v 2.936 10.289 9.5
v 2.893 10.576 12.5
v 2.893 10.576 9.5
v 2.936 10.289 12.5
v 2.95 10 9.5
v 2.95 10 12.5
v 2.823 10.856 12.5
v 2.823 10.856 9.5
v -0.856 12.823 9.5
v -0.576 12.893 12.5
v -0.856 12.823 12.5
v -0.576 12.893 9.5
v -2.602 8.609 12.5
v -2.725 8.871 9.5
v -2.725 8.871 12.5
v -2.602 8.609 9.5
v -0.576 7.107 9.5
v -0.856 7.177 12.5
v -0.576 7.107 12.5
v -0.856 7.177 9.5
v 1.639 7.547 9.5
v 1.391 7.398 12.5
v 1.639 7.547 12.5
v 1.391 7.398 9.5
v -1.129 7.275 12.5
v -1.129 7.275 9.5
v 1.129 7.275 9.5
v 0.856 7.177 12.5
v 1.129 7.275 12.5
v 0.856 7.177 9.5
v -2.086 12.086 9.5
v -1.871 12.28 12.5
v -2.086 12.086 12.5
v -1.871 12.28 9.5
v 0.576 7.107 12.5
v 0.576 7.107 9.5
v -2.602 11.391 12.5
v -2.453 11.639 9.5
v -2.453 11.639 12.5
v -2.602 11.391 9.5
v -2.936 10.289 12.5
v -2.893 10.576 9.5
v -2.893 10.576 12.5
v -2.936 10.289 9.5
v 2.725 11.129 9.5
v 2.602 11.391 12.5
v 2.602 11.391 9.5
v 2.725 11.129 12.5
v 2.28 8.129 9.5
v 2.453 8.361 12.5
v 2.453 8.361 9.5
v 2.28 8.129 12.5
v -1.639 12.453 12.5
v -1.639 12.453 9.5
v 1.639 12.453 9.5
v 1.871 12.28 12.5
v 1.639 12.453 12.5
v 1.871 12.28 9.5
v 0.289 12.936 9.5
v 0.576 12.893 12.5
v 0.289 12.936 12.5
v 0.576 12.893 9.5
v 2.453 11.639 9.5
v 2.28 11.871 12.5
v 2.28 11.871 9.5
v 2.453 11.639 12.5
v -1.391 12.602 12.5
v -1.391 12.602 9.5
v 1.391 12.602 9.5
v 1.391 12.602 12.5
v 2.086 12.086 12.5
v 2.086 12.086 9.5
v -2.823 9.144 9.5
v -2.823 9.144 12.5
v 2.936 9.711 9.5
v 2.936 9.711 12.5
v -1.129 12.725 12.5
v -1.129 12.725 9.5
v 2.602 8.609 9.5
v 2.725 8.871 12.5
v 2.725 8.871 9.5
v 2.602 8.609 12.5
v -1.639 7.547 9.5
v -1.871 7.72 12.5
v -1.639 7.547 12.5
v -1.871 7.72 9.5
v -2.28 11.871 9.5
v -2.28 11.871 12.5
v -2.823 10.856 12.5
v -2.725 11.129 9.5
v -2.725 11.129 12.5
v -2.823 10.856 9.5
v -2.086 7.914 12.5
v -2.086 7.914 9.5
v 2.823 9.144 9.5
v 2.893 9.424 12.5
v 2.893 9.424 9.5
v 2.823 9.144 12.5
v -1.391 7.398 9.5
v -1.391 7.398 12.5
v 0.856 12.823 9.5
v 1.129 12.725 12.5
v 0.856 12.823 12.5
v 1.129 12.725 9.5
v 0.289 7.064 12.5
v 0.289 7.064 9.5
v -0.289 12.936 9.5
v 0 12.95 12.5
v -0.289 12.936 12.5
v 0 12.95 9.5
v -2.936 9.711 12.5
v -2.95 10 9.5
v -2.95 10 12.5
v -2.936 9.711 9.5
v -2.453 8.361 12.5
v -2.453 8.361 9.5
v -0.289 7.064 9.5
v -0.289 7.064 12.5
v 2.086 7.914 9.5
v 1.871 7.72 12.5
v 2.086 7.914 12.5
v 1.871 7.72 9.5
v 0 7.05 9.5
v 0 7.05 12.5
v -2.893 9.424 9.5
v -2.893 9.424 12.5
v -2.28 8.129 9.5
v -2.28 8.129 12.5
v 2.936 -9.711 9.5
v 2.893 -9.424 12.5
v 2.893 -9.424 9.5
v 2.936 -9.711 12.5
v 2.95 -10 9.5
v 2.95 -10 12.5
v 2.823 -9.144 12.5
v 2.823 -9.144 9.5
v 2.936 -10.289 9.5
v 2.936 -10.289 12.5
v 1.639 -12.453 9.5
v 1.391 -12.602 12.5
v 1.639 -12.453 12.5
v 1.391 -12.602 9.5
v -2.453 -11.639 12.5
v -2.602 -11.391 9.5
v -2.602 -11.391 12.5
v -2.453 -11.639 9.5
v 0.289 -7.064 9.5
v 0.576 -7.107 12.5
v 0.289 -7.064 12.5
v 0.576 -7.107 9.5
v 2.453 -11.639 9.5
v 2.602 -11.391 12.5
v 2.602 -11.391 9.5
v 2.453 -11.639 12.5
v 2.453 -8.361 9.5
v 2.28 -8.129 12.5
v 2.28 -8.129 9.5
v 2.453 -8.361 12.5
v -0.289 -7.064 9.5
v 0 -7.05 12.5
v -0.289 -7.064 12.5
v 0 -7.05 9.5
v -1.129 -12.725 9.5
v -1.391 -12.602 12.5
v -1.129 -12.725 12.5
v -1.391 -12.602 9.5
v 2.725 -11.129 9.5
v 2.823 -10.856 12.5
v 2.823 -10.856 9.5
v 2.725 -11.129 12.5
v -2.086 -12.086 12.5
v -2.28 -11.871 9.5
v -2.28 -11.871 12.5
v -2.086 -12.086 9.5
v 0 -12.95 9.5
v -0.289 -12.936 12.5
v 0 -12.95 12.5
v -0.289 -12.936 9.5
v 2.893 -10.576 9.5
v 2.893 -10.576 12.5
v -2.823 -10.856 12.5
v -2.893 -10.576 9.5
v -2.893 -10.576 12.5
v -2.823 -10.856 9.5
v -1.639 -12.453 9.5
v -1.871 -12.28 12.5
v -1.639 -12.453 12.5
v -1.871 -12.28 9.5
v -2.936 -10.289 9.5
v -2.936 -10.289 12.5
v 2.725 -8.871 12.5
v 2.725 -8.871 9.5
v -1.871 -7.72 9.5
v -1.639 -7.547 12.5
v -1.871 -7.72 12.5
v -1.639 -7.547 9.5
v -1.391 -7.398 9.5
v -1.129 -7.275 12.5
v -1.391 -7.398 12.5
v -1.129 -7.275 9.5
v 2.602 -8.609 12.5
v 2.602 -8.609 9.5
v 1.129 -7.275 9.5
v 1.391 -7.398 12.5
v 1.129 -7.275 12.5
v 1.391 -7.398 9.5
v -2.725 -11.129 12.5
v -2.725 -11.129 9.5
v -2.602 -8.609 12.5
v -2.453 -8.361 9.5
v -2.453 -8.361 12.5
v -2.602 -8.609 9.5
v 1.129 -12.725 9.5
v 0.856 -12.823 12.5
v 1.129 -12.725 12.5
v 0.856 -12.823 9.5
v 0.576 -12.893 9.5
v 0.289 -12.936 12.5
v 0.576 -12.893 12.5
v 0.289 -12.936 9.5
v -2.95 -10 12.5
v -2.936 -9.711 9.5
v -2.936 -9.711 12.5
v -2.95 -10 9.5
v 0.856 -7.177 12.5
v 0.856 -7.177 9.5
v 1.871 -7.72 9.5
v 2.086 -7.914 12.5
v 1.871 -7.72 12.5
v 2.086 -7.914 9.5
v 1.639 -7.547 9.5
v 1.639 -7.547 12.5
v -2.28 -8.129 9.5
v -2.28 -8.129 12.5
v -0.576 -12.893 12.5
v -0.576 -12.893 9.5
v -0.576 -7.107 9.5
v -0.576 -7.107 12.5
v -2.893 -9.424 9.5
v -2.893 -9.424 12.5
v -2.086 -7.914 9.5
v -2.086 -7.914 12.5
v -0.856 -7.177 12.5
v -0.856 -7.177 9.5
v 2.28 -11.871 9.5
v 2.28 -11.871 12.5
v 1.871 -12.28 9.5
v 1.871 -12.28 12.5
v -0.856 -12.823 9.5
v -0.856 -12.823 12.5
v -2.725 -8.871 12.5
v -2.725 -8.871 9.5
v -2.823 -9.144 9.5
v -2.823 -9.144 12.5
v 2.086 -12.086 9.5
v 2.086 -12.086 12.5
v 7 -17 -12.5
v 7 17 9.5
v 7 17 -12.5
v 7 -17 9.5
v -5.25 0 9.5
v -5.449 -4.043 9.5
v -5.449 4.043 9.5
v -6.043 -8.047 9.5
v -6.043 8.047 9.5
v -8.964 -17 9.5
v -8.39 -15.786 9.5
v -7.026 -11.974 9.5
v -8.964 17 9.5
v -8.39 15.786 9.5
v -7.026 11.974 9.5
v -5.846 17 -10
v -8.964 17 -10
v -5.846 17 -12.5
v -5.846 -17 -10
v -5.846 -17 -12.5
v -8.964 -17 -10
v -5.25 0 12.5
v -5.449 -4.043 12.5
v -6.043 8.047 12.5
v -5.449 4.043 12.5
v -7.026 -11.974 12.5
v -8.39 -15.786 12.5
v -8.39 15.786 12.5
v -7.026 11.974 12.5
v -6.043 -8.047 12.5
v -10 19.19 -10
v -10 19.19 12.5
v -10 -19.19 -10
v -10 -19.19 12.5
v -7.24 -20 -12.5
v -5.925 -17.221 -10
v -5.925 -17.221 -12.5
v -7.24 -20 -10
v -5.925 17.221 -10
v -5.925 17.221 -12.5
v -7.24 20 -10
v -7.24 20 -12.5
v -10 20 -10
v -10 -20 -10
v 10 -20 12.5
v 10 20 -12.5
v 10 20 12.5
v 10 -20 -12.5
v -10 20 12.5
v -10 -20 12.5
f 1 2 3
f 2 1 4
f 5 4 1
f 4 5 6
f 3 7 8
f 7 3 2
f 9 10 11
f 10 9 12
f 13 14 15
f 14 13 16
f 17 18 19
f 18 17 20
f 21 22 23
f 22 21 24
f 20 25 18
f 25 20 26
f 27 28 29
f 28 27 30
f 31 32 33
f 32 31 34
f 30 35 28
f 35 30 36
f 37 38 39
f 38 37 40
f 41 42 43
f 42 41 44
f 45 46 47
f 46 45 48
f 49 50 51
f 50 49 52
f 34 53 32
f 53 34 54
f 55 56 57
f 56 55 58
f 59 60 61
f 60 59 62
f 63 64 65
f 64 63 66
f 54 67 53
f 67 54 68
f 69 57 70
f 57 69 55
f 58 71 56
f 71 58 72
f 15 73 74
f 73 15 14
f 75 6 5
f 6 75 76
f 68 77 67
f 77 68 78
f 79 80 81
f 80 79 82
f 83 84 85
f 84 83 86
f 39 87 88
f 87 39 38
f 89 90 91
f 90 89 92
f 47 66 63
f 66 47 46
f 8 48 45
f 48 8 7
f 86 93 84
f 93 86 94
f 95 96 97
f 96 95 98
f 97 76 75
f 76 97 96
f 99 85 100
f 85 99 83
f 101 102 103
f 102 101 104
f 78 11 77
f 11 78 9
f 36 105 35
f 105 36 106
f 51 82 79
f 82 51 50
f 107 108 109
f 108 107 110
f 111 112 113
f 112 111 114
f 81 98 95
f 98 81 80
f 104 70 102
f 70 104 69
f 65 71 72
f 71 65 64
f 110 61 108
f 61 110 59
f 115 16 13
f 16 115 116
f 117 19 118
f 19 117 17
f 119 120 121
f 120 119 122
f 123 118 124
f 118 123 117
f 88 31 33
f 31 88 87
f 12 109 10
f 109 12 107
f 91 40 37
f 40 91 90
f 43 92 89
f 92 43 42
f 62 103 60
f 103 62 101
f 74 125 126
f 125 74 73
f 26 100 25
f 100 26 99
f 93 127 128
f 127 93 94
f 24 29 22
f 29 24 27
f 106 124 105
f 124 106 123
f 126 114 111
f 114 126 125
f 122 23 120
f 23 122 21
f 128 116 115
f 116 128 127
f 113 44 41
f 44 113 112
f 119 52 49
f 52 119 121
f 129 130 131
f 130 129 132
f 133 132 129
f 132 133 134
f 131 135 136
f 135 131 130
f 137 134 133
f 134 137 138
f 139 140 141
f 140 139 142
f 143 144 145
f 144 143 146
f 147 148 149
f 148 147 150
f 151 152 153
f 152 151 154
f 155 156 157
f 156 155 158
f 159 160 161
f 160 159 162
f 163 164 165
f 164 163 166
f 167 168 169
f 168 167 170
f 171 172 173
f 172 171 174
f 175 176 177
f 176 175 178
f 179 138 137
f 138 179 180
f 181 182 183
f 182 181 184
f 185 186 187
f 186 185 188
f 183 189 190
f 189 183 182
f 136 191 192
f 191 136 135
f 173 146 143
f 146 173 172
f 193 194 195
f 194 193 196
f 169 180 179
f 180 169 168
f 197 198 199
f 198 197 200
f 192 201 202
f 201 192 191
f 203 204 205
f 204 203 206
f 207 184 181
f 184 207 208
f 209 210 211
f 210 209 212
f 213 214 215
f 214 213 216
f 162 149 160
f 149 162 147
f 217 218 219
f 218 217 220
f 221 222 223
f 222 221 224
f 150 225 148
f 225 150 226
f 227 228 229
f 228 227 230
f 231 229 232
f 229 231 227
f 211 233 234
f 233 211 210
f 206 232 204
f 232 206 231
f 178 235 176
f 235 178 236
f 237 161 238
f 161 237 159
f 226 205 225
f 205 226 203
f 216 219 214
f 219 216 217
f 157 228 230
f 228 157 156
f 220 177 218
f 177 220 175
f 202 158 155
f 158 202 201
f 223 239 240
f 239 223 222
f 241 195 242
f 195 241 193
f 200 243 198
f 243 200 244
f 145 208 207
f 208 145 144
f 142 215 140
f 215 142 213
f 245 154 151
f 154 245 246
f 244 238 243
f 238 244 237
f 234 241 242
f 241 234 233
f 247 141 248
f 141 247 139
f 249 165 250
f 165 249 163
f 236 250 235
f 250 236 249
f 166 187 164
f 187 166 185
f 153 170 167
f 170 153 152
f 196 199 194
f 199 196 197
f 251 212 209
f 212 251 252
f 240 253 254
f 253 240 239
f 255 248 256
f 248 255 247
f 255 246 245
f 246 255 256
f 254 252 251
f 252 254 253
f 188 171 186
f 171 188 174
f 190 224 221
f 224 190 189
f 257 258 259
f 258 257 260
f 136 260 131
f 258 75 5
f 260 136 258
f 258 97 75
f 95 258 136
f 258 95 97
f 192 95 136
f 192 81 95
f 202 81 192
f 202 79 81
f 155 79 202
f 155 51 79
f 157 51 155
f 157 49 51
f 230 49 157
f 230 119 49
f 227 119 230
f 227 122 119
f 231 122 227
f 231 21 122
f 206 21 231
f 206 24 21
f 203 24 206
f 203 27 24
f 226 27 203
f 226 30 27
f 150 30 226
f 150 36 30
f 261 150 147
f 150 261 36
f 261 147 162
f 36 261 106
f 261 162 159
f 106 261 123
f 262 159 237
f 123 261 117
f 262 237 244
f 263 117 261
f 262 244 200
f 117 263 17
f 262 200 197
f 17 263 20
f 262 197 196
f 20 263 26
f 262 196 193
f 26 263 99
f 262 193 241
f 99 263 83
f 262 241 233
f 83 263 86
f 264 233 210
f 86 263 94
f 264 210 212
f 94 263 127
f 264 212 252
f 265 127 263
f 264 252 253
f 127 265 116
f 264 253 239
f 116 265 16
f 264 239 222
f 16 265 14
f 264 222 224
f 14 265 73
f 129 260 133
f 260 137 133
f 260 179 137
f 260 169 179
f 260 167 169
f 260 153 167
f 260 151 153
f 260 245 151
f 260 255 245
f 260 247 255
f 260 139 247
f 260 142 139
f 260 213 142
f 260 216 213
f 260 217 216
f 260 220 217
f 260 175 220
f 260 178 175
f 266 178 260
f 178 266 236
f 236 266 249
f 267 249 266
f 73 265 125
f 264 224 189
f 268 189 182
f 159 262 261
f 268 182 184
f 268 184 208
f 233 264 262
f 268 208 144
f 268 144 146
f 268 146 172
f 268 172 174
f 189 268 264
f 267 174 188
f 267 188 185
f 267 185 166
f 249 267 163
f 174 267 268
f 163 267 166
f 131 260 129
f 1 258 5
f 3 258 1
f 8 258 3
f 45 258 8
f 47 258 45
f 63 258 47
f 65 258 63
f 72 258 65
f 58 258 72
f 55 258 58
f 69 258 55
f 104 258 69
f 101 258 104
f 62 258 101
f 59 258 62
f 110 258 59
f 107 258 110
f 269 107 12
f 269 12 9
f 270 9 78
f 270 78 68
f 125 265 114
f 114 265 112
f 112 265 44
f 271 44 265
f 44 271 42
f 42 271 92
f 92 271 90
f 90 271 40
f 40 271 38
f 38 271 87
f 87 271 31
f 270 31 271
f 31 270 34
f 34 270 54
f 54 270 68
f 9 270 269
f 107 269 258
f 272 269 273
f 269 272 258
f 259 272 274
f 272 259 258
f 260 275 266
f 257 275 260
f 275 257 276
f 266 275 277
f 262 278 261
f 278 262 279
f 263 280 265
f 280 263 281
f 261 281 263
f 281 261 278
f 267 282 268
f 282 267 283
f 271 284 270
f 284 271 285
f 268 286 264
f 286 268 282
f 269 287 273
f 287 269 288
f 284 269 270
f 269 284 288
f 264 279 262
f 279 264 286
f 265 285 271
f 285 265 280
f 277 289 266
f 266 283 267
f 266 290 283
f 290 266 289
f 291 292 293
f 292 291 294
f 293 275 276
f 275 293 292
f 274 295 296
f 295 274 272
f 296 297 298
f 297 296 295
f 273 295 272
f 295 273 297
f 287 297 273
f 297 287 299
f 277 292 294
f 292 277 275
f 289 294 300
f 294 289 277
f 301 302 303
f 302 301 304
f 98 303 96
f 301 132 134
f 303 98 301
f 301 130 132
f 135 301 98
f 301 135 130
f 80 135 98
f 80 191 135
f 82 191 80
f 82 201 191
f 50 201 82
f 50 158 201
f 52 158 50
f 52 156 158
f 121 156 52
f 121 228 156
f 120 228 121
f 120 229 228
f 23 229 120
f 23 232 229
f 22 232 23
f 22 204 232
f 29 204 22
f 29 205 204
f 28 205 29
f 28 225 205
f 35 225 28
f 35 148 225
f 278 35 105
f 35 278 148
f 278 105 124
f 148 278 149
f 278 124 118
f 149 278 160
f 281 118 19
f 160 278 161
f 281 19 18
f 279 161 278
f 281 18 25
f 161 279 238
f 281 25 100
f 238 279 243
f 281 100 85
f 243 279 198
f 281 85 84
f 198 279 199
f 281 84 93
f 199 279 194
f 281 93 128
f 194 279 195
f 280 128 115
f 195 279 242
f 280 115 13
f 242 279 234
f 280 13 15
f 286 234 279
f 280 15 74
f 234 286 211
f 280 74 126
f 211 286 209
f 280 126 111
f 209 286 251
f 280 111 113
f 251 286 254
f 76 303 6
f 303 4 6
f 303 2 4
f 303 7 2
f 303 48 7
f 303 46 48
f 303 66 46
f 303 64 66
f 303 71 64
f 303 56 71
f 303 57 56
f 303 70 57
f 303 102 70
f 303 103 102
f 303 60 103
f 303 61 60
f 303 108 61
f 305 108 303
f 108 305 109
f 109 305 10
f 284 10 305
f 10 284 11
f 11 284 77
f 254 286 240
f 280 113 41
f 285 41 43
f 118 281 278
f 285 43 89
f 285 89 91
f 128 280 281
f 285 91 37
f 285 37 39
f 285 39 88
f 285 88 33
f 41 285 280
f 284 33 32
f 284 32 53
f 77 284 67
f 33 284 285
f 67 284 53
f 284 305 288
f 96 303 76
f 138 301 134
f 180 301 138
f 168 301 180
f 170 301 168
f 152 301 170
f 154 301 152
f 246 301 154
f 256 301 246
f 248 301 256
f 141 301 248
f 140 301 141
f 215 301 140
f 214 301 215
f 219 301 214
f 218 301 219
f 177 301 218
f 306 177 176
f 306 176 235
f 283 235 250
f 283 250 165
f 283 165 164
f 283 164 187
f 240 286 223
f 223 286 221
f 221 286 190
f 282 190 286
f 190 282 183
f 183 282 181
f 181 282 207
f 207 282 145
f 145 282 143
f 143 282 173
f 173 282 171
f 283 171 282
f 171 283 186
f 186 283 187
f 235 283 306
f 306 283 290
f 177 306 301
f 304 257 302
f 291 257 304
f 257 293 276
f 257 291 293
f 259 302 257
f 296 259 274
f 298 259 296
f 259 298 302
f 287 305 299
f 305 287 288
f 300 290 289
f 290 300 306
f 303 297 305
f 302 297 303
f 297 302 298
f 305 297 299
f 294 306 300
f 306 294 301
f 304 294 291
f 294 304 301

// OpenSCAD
// file: nut_banana.scad
//nut();

module nut() {
  color("pink")
  difference() {
    cylinder(d=12, h=2, center=true, $fn=6);
    cylinder(d=5.5, h=3, center=true, $fn=64);
  }
}  
// main file
include <nut_banana.scad>


$fn = 64;
diam_hole = 5.4 + 0.5;

banana();


//translate([0, 0, -25/2-0.5])
//banana();
//translate([0, 20/2, -5])
//rotate([0, 0, 90])
//nut();
//
//translate([0, -20/2, -5])
//rotate([0, 0, 90])
//nut();
//color("red")
//translate([-3, 0, 0])
//cube([20, 40-6, 25-6], center=true);


module banana() {
    difference() {
        base();
        holes_banana();
    }
}
module base() {
    cube([20, 40, 25], center=true);
}

module holes_banana() {
  translate([0, 20/2, 2])
    cylinder(d=diam_hole, h=50,center = true);

  translate([0, -20/2, 2])
    cylinder(d=diam_hole, h=50,center = true);
    
  translate([-3, 0, -3])
  cube([20, 40-6, 25], center=true);  
    
  translate([-85/2-4, 0, 0])
  cylinder(d = 80+5/2, h = 150, center=true);  
    
  translate([-85/2-5, 0, -15])
  #cylinder(d=90, h=10, center=true);  
}
